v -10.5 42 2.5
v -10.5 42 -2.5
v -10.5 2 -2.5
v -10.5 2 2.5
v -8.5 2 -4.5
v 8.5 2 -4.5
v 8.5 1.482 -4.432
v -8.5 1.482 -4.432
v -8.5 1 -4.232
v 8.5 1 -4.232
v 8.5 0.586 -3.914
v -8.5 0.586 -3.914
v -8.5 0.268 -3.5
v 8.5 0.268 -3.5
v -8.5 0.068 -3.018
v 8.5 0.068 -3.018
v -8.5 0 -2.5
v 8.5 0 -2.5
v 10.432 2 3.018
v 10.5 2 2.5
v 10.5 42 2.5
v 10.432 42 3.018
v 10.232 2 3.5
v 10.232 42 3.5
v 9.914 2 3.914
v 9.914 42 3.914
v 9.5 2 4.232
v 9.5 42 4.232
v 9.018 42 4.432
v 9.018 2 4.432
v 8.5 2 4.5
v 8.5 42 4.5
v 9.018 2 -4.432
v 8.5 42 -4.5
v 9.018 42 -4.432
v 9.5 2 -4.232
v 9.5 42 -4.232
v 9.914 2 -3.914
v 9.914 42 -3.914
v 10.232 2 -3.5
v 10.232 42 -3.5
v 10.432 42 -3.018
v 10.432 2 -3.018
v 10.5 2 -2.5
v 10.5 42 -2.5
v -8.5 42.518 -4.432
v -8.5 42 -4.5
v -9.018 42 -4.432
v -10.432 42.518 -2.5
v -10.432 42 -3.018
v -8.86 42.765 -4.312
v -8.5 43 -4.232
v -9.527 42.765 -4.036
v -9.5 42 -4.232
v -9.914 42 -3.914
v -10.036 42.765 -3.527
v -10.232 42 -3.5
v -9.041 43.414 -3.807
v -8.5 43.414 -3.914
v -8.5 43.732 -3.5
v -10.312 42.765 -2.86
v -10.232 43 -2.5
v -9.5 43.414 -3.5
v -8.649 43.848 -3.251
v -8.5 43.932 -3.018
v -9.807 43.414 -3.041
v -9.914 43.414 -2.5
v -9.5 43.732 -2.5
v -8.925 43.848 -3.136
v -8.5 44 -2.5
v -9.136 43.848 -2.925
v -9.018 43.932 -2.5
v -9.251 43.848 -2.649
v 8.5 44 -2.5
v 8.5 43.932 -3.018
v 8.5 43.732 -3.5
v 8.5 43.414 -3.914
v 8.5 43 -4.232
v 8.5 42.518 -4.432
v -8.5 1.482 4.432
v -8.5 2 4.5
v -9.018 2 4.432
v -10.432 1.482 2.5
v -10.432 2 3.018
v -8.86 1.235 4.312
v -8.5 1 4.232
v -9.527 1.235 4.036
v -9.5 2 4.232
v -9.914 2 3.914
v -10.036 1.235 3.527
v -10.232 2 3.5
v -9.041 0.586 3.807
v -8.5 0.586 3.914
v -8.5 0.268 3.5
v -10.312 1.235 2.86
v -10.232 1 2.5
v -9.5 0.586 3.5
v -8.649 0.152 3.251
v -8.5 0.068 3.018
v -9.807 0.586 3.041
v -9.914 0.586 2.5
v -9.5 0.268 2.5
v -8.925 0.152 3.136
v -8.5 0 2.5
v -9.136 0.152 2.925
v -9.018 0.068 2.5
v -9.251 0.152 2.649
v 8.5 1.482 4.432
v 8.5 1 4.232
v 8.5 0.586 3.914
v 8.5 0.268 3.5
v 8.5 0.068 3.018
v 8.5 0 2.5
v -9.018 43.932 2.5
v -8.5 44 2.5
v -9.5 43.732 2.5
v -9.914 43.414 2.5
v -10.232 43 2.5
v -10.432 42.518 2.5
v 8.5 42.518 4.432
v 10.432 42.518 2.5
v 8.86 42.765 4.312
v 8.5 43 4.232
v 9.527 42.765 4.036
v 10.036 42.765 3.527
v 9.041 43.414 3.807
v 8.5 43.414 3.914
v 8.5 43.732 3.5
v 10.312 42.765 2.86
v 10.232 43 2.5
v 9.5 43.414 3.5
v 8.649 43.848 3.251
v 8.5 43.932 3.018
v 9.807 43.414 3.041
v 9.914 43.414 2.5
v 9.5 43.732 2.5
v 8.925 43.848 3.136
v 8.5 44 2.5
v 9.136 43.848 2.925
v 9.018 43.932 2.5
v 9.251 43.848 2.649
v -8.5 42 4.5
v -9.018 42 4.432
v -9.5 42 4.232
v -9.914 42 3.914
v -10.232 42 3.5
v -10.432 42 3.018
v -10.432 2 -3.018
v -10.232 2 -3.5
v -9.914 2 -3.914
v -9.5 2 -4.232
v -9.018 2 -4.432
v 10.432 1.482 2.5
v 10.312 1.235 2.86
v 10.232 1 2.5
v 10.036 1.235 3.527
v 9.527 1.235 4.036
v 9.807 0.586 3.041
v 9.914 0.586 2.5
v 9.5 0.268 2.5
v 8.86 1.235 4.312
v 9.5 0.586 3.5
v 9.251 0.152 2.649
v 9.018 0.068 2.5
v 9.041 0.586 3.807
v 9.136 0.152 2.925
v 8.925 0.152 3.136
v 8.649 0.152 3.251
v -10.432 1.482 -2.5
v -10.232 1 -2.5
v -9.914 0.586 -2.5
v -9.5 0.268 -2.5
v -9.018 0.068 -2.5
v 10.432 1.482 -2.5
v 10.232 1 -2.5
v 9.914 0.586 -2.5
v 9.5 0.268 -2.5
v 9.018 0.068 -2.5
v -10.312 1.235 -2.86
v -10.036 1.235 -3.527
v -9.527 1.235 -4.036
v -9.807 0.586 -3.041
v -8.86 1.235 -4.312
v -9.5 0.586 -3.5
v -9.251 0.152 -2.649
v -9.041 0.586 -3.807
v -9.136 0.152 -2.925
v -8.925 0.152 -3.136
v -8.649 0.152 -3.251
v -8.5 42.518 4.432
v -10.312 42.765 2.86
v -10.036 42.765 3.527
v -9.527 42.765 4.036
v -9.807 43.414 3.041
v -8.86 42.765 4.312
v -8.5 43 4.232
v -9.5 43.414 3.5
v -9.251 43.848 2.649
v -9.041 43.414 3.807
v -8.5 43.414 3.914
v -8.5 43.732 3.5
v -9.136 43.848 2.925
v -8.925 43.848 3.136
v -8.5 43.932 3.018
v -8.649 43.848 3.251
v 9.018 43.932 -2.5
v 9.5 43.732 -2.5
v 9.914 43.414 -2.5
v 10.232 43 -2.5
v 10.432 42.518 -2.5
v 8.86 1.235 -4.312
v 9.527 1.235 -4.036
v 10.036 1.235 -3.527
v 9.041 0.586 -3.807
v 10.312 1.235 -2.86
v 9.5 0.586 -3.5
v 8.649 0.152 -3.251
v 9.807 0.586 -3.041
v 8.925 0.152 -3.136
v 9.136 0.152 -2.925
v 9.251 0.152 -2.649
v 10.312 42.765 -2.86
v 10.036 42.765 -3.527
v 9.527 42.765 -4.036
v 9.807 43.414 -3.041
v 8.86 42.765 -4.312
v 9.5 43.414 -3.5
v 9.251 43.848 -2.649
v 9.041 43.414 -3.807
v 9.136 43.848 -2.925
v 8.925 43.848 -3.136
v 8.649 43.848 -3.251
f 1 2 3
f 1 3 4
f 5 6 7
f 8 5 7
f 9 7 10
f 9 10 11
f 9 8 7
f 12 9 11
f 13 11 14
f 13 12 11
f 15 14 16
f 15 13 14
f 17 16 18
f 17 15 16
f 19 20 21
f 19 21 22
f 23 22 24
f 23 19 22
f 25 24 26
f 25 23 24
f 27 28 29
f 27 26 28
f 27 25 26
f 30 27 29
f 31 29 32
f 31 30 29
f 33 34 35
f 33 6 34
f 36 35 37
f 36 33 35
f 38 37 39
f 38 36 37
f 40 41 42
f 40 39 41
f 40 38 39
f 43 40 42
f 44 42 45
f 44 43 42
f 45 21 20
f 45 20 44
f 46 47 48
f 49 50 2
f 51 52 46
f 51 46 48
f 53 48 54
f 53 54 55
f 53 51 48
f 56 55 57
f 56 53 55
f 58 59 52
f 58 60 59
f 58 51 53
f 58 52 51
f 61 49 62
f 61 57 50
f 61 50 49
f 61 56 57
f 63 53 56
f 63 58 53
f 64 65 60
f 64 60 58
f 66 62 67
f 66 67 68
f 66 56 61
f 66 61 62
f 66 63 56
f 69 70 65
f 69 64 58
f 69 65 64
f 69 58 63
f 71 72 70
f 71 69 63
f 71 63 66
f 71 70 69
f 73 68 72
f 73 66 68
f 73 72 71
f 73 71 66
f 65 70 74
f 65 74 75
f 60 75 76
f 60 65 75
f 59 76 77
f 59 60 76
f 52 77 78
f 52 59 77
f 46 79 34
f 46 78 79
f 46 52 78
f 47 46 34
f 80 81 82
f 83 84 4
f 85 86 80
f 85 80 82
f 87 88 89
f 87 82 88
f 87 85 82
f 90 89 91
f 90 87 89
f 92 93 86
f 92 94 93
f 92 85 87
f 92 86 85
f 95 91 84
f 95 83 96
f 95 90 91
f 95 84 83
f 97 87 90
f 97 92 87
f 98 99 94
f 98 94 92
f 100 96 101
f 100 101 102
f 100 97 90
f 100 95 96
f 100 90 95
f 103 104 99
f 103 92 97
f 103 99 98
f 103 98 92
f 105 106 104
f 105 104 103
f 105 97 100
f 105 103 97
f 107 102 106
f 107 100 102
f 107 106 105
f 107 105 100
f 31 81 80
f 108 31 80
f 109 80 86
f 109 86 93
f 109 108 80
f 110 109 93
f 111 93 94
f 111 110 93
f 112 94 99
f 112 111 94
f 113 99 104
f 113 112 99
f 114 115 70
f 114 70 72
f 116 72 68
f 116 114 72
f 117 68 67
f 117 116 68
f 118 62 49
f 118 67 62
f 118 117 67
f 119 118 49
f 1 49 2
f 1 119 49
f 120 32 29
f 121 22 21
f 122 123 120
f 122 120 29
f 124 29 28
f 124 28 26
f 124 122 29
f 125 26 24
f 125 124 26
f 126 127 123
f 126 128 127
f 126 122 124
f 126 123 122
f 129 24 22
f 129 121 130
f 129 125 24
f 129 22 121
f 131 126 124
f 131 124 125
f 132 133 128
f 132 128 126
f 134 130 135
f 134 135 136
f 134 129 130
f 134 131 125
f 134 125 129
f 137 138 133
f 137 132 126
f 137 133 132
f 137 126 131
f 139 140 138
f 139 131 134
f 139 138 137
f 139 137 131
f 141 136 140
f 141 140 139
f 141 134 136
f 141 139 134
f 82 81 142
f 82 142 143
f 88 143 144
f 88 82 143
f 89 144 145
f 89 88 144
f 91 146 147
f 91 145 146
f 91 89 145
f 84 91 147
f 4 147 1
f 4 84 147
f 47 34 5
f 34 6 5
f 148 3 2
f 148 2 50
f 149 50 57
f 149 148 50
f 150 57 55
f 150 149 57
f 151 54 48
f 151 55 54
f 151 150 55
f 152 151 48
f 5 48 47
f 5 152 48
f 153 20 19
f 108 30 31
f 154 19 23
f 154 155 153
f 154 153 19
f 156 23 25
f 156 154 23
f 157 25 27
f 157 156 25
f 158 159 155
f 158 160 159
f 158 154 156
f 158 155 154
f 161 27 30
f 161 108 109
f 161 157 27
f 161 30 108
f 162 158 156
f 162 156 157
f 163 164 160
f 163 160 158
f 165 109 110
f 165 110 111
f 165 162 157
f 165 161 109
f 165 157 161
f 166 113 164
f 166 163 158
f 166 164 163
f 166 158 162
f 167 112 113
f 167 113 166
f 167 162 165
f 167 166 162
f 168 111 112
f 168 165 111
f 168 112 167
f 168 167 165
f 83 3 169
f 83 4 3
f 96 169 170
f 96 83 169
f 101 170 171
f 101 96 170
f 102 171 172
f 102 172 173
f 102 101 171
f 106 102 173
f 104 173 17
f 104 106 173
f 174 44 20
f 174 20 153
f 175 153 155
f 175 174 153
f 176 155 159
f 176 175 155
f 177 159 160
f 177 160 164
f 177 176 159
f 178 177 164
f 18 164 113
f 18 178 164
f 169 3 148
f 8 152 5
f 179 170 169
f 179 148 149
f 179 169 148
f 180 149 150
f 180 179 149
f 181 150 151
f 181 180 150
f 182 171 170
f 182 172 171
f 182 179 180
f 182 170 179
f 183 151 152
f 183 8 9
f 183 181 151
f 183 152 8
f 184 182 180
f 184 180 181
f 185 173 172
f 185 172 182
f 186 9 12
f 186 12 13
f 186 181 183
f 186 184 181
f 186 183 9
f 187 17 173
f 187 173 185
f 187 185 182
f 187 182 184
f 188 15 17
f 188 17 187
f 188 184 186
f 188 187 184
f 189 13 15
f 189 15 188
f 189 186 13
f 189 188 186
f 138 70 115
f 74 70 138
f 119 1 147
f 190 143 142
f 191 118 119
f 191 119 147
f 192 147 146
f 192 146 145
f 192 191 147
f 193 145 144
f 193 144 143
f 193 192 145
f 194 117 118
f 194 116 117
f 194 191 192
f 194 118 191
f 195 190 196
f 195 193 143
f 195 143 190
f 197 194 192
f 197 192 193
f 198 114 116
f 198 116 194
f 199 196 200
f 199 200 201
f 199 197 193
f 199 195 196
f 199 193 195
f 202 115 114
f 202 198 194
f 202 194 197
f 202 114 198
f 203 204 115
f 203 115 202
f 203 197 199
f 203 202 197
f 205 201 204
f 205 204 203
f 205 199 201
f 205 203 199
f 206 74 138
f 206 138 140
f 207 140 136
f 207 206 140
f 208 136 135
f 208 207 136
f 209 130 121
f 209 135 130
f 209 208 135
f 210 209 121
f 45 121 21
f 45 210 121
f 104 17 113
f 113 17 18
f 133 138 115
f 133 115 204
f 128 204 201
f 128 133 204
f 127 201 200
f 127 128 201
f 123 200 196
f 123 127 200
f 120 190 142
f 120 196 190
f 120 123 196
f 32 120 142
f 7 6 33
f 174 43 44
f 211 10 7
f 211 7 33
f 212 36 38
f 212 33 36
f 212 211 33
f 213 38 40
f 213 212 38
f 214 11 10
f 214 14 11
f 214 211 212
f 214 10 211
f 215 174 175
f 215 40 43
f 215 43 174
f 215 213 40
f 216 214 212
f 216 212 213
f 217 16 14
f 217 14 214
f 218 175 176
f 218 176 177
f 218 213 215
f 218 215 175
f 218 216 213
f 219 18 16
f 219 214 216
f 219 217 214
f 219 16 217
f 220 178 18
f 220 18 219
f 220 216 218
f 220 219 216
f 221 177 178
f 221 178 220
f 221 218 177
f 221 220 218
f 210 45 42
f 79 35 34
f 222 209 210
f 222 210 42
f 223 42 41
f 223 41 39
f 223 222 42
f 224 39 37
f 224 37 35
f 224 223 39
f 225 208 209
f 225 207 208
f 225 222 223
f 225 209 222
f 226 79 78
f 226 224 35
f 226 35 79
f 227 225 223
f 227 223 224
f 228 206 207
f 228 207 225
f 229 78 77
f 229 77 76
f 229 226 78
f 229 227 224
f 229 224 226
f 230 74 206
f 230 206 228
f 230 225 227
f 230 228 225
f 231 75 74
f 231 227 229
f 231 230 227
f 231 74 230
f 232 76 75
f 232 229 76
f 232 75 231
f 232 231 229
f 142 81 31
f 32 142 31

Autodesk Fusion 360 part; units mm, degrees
sketch "Sketch2" plane through (0, 0, 0) normal (0, 1, 0) x (1, 0, 0)
  line L0 (8.5, 4.5) -> (-8.5, 4.5)
  line L1 (-10.5, 2.5) -> (-10.5, -2.5)
  line L2 (-8.5, -4.5) -> (8.5, -4.5)
  line L3 (10.5, -2.5) -> (10.5, 2.5)
  line L4 (10.5, 4.5) -> (-10.5, -4.5) construction
  line L5 (-10.5, 4.5) -> (10.5, -4.5) construction
  arc A0 (-10.5, -2.5) -> (-8.5, -4.5) centre (-8.5, -2.5) ccw
  arc A1 (-8.5, 4.5) -> (-10.5, 2.5) centre (-8.5, 2.5) ccw
  arc A2 (10.5, 2.5) -> (8.5, 4.5) centre (8.5, 2.5) ccw
  arc A3 (8.5, -4.5) -> (10.5, -2.5) centre (8.5, -2.5) ccw
  dimension "d1" = 21
  dimension "d2" = 9
  dimension "d3" = 2
  dimension "d4" = 2
  dimension "d5" = 2
  dimension "d6" = 2
extrude "Extrude1" add sketch "Sketch2" along normal blind 44
fillet "Fillet1" radius 2 1 faces at (-2.8333, 0, -1.5)
fillet "Fillet2" radius 2 1 faces at (-2.8333, 44, -1.5)
